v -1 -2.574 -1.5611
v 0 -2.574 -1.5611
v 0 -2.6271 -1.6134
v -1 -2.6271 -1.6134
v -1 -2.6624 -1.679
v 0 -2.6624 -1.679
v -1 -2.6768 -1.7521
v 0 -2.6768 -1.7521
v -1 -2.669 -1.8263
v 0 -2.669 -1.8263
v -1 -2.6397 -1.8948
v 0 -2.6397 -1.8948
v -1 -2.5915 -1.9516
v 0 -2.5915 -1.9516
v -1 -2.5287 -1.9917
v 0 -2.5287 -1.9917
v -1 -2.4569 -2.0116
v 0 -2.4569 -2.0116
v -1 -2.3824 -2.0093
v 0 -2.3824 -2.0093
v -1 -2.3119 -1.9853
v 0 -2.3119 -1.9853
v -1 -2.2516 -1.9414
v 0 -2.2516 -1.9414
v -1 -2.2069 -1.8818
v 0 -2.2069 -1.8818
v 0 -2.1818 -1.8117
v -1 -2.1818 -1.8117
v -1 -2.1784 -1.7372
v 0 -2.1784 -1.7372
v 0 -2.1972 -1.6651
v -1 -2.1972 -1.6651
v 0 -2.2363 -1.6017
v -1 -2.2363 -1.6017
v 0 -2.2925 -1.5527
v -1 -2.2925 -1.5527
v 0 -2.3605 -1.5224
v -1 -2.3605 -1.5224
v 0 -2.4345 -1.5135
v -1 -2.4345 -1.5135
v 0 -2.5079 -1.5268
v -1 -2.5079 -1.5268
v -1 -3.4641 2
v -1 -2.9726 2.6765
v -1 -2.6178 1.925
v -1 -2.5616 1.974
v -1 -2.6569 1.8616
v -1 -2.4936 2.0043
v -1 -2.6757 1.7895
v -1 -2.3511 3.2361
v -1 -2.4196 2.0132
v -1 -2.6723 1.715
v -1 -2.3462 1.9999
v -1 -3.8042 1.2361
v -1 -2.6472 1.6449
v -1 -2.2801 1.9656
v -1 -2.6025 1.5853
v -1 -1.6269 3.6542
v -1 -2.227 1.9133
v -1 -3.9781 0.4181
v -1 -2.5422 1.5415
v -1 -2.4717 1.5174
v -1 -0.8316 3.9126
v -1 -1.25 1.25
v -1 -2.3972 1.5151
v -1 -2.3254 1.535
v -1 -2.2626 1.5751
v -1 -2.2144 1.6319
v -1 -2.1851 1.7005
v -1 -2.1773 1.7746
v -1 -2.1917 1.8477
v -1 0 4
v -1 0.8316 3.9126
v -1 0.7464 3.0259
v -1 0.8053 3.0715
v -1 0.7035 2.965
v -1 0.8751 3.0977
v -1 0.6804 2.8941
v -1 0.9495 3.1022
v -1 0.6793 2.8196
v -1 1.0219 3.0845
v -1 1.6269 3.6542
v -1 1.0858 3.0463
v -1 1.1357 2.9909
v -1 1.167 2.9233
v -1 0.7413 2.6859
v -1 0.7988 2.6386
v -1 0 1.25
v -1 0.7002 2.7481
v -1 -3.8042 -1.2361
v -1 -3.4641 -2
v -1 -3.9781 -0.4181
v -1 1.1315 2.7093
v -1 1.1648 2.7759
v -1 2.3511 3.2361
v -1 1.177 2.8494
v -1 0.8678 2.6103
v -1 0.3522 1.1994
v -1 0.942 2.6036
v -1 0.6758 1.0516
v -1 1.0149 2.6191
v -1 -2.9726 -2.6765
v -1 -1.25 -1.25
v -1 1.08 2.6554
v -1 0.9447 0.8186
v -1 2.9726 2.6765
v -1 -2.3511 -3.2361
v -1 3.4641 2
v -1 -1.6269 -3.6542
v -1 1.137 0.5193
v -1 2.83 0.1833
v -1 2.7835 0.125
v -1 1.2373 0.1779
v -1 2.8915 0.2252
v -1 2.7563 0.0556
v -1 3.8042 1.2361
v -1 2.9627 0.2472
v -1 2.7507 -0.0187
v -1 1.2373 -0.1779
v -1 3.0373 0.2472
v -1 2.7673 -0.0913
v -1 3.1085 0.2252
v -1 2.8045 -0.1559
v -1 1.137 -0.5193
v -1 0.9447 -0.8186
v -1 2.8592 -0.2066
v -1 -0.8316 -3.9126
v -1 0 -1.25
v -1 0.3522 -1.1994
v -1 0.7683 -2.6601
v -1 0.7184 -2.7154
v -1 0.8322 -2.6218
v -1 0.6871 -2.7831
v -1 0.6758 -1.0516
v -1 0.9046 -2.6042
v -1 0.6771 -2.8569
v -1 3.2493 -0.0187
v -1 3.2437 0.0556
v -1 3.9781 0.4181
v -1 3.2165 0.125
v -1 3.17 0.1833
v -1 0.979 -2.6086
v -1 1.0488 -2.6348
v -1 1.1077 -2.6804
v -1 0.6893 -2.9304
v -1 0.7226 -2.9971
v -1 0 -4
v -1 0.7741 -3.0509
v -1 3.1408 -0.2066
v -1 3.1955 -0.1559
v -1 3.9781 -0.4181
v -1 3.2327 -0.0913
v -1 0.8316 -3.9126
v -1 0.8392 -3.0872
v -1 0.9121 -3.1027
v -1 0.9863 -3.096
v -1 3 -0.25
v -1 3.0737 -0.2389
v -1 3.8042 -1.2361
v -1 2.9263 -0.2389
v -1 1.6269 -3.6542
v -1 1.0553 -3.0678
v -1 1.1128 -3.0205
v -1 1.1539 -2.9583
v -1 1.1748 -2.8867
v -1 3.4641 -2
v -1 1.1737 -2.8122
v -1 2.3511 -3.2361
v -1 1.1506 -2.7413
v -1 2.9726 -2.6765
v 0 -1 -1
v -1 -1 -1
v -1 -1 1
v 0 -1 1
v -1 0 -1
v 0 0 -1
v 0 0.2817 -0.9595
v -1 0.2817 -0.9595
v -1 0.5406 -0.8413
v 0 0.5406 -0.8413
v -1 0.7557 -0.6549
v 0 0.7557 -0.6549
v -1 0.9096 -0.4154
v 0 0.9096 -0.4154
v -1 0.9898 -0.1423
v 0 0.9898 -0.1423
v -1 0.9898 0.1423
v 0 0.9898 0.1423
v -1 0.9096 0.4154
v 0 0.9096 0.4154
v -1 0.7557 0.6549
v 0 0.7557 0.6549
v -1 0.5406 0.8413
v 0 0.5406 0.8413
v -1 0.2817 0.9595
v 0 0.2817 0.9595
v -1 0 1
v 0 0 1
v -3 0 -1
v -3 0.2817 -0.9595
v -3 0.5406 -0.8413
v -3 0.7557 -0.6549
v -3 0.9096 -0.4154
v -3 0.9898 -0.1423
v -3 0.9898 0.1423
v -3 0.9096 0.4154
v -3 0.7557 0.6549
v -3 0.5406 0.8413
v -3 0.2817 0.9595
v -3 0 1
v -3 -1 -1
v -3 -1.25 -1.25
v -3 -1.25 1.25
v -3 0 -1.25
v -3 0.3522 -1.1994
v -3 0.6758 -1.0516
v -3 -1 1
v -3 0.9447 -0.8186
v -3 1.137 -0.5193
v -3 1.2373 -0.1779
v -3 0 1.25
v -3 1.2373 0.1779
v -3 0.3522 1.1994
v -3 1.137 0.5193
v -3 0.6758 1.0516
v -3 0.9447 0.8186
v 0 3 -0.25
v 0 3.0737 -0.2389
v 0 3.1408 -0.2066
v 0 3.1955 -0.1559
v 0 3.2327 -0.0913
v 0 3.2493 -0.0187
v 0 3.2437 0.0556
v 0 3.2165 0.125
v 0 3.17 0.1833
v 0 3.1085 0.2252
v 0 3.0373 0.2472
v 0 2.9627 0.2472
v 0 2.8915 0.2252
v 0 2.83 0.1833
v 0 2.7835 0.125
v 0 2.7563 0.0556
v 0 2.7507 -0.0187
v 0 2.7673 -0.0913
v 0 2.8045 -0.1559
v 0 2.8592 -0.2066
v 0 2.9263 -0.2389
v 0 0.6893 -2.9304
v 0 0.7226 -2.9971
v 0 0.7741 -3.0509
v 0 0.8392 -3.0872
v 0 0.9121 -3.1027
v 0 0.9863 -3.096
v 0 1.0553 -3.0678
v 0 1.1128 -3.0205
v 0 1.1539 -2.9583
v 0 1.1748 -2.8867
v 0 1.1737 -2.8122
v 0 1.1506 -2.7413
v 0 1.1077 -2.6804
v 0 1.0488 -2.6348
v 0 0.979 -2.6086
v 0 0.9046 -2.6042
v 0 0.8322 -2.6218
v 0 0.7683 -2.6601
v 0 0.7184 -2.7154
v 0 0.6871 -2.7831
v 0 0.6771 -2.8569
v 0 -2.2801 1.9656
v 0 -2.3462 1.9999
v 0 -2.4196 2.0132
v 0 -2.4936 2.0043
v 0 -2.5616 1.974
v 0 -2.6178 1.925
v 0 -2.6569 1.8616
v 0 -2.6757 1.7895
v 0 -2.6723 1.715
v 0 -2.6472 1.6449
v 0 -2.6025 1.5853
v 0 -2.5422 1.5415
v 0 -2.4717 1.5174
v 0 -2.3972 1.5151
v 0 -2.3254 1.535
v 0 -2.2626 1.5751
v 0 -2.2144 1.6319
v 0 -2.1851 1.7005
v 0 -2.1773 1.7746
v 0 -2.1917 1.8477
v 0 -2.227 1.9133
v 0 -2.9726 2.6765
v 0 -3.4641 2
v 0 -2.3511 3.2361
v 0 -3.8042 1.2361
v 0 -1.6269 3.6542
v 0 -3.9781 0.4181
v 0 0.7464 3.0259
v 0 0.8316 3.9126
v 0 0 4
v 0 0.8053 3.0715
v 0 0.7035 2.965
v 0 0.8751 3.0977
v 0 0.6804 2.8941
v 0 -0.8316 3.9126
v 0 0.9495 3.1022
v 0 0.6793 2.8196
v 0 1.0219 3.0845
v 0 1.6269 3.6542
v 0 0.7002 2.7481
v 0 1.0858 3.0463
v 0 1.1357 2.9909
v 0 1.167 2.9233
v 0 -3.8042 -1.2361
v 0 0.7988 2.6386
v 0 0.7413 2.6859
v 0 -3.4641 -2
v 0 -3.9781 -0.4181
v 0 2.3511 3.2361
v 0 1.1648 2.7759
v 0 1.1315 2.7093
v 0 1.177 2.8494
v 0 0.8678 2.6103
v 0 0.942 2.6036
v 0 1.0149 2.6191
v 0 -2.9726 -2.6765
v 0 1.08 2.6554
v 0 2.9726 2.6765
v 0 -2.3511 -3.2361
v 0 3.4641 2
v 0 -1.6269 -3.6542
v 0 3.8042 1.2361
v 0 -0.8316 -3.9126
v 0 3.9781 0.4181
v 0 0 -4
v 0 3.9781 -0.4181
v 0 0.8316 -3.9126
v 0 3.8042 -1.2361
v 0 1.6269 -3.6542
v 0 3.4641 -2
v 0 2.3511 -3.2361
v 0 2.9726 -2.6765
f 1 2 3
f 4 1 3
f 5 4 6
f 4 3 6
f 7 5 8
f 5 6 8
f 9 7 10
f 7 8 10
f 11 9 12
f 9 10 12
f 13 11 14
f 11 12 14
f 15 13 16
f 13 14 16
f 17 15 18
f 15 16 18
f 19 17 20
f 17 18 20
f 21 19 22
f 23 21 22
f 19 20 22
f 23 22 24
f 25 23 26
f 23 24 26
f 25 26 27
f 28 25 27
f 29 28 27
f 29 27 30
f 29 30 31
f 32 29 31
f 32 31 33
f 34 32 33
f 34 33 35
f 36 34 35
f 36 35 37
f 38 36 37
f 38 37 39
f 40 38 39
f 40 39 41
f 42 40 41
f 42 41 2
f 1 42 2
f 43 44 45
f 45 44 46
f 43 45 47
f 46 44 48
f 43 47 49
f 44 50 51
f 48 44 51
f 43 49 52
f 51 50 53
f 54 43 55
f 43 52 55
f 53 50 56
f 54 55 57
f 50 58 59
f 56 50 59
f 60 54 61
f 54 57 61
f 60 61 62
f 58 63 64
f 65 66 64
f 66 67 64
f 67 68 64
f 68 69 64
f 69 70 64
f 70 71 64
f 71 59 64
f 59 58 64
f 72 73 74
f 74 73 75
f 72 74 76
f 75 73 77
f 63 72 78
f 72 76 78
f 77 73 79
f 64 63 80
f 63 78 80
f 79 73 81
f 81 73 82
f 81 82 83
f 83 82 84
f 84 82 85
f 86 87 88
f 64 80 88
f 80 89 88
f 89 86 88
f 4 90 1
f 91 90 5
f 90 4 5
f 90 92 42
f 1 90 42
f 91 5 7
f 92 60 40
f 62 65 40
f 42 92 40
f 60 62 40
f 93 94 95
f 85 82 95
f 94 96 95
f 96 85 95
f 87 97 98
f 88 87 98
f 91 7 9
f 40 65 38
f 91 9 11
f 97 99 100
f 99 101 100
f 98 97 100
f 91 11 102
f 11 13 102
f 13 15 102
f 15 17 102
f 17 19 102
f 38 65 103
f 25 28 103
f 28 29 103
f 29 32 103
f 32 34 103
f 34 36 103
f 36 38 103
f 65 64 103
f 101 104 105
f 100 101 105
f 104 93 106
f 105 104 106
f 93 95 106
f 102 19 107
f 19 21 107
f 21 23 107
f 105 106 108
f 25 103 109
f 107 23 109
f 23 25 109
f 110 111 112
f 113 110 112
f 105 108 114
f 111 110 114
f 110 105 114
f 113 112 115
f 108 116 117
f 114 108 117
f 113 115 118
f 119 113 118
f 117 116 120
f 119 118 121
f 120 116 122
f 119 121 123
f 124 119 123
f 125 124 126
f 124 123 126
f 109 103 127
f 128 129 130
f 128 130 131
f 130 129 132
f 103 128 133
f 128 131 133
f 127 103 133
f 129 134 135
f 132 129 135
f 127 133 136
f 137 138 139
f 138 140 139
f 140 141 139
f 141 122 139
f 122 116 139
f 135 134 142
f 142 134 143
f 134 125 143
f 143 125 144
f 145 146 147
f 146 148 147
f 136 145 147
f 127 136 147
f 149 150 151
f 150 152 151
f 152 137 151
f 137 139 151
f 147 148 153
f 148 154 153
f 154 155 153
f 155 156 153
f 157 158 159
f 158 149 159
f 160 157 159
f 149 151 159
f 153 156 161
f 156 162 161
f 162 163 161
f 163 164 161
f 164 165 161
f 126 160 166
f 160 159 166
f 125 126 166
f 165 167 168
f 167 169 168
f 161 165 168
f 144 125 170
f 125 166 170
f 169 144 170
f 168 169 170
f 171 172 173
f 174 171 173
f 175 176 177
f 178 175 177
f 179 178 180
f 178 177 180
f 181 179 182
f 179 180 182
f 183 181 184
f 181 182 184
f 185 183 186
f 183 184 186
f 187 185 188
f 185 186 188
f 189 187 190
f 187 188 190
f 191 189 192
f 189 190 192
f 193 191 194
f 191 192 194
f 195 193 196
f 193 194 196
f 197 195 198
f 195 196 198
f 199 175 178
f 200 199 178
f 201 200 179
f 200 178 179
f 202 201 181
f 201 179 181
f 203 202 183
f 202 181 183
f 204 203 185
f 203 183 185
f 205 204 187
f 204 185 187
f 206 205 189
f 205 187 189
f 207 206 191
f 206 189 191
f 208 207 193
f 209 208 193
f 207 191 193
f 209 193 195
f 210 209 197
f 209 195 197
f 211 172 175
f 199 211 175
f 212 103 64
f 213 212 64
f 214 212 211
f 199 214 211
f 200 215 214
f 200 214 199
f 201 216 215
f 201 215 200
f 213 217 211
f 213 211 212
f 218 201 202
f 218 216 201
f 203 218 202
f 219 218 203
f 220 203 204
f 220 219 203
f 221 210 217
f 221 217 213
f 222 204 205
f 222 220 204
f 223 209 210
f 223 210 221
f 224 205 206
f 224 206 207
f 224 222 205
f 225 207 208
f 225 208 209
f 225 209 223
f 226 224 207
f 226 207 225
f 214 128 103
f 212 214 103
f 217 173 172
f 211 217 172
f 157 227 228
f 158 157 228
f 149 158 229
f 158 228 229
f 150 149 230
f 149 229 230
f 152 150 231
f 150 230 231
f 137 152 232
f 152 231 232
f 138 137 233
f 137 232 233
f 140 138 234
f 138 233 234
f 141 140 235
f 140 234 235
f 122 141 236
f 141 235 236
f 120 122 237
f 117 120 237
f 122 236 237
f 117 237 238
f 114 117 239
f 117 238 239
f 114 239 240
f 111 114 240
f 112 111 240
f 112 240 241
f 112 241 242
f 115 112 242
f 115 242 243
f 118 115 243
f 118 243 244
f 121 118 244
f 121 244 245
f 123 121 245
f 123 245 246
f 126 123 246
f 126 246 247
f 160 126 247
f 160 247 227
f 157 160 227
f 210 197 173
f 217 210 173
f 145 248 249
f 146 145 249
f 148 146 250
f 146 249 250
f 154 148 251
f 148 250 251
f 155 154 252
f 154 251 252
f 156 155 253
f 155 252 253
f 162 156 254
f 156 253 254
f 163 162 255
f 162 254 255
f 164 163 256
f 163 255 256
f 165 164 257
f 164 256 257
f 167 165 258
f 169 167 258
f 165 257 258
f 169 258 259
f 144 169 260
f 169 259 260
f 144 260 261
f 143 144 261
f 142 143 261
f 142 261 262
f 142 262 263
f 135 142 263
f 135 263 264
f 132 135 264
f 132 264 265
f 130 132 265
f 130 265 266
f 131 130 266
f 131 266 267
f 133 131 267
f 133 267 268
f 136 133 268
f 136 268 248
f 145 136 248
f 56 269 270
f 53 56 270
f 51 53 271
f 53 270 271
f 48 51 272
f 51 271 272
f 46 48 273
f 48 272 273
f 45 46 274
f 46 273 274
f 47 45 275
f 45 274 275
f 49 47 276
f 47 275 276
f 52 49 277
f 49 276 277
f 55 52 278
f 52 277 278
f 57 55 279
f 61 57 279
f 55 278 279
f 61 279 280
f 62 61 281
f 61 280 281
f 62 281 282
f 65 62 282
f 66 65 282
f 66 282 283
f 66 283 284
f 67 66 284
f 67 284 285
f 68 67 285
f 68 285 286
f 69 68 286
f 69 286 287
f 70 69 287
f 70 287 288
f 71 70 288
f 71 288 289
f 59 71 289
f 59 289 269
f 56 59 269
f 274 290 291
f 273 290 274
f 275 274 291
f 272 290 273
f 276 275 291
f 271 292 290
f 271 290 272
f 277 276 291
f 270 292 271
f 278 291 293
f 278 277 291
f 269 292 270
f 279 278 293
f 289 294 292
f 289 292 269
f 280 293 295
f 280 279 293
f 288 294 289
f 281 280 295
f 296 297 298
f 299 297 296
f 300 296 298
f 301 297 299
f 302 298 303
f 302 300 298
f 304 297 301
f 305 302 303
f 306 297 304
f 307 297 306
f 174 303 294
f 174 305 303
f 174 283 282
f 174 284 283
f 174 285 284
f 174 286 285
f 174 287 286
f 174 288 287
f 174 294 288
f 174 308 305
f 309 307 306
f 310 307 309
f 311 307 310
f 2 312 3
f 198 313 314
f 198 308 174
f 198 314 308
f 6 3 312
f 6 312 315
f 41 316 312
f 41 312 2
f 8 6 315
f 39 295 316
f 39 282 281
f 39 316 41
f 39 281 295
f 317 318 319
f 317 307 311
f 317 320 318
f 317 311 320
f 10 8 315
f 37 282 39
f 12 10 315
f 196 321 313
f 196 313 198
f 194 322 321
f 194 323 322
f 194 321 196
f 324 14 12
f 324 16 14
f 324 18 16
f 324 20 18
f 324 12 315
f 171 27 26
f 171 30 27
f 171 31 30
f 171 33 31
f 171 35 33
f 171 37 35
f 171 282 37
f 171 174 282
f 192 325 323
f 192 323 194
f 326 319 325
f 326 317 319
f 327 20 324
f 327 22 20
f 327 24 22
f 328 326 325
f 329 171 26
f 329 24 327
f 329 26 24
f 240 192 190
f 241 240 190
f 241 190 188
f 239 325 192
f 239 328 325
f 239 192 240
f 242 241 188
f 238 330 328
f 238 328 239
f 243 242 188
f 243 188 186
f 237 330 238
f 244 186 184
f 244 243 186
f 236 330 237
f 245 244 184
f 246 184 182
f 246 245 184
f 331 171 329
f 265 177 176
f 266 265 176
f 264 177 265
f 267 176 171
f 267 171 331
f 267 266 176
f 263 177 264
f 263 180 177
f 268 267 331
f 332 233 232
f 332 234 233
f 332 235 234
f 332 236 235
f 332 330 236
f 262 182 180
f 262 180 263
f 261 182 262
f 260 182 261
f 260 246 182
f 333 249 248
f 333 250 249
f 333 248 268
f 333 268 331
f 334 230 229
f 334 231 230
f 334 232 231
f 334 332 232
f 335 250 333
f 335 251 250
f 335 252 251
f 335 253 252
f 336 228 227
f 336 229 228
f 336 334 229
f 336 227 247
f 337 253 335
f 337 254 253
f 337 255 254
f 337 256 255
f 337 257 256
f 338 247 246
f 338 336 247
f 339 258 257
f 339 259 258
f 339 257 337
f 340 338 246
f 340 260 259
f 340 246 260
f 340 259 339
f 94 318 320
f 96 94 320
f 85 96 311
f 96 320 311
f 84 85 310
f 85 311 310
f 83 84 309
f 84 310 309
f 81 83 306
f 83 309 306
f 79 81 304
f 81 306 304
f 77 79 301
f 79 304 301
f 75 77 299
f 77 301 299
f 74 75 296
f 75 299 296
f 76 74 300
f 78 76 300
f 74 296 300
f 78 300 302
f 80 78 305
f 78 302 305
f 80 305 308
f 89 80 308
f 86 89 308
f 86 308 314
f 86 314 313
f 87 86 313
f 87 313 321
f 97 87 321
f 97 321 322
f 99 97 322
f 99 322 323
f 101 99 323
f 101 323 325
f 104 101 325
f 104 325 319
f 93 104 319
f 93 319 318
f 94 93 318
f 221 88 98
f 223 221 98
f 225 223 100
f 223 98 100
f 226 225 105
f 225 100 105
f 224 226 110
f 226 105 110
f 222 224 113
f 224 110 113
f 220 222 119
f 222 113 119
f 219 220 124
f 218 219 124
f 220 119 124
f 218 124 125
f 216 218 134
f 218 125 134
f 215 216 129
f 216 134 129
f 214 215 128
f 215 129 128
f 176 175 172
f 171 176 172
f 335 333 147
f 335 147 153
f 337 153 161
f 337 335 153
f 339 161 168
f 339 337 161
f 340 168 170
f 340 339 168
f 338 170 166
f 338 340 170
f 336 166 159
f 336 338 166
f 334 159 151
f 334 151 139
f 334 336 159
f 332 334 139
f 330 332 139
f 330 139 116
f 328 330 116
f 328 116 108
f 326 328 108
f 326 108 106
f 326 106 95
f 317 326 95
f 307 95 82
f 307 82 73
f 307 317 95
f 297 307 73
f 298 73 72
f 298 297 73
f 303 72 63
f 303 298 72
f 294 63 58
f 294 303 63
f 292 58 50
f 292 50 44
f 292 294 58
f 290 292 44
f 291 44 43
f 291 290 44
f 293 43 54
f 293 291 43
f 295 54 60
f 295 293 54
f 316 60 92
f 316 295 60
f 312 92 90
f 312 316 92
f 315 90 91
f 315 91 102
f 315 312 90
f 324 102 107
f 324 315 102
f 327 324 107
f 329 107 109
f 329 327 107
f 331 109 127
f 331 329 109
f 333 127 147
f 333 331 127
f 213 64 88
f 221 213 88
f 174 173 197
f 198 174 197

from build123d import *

# Parameters (mm, degrees)
SKETCH2_R           = 4
BOSS_EXTRUDE1_DEPTH = 1
SKETCH4_R           = 1
CUT_EXTRUDE1_DEPTH  = 2.5
SKETCH5_R           = 0.25
CUT_EXTRUDE2_DEPTH  = 2
CIRPATTERN1_COUNT   = 5
CUT_EXTRUDE3_DEPTH  = 6.744562647
BOSS_EXTRUDE2_DEPTH = 2


with BuildPart() as part:
    # Sketch2 → Boss-Extrude1 (new body)
    with BuildSketch(Plane(origin=(0, 0, 0), x_dir=(0, 0, -1), z_dir=(1, 0, 0))):
        Circle(SKETCH2_R)
    extrude(amount=-BOSS_EXTRUDE1_DEPTH)

    # Sketch4 → Cut-Extrude1 (cut)
    with BuildSketch(Plane(origin=(0, 0, 0), x_dir=(0, 0, -1), z_dir=(1, 0, 0))):
        Circle(SKETCH4_R)
    extrude(amount=-CUT_EXTRUDE1_DEPTH, mode=Mode.SUBTRACT)

    # Sketch5 → Cut-Extrude2 (cut)
    with BuildSketch(Plane(origin=(0, 0, 0), x_dir=(0, 0, -1), z_dir=(1, 0, 0))):
        with Locations((0, 3)):
            Circle(SKETCH5_R)
    cut_extrude2 = extrude(amount=-CUT_EXTRUDE2_DEPTH, mode=Mode.SUBTRACT)

    # CirPattern1: Cut-Extrude2 ×5 about axis
    cirpattern1_axis = Axis((-2.5, 0, 0), (1, 0, 0))
    for i in range(1, CIRPATTERN1_COUNT):
        add(cut_extrude2.rotate(cirpattern1_axis, i * 360 / CIRPATTERN1_COUNT), mode=Mode.SUBTRACT)

    # Sketch6 → Cut-Extrude3 (cut, through all)
    with BuildSketch(Plane.ZY.offset(1)):
        with BuildLine():
            Line((-1, -1), (0, -1))
            ThreePointArc((0, -1), (-0.707106781, -0.707106781), (-1, 0))
            Line((-1, 0), (-1, -1))
        make_face()
        with BuildLine():
            Line((0, -1), (1, -1))
            Line((1, -1), (1, 0))
            ThreePointArc((1, 0), (0.707106781, -0.707106781), (0, -1))
        make_face()
    extrude(amount=-CUT_EXTRUDE3_DEPTH, mode=Mode.SUBTRACT)

    # Sketch6<3> → Boss-Extrude2 (add)
    with BuildSketch(Plane.ZY.offset(1)):
        with BuildLine():
            Line((-1.25, -1.25), (1.25, -1.25))
            Line((1.25, -1.25), (1.25, 0))
            ThreePointArc((1.25, 0), (0, 1.25), (-1.25, 0))
            Line((-1.25, 0), (-1.25, -1.25))
        make_face()
        with BuildLine():
            Line((-1, -1), (-1, 0))
            ThreePointArc((-1, 0), (0, 1), (1, 0))
            Line((1, 0), (1, -1))
            Line((1, -1), (-1, -1))
        make_face(mode=Mode.SUBTRACT)
    extrude(amount=BOSS_EXTRUDE2_DEPTH)


solid = part.part
